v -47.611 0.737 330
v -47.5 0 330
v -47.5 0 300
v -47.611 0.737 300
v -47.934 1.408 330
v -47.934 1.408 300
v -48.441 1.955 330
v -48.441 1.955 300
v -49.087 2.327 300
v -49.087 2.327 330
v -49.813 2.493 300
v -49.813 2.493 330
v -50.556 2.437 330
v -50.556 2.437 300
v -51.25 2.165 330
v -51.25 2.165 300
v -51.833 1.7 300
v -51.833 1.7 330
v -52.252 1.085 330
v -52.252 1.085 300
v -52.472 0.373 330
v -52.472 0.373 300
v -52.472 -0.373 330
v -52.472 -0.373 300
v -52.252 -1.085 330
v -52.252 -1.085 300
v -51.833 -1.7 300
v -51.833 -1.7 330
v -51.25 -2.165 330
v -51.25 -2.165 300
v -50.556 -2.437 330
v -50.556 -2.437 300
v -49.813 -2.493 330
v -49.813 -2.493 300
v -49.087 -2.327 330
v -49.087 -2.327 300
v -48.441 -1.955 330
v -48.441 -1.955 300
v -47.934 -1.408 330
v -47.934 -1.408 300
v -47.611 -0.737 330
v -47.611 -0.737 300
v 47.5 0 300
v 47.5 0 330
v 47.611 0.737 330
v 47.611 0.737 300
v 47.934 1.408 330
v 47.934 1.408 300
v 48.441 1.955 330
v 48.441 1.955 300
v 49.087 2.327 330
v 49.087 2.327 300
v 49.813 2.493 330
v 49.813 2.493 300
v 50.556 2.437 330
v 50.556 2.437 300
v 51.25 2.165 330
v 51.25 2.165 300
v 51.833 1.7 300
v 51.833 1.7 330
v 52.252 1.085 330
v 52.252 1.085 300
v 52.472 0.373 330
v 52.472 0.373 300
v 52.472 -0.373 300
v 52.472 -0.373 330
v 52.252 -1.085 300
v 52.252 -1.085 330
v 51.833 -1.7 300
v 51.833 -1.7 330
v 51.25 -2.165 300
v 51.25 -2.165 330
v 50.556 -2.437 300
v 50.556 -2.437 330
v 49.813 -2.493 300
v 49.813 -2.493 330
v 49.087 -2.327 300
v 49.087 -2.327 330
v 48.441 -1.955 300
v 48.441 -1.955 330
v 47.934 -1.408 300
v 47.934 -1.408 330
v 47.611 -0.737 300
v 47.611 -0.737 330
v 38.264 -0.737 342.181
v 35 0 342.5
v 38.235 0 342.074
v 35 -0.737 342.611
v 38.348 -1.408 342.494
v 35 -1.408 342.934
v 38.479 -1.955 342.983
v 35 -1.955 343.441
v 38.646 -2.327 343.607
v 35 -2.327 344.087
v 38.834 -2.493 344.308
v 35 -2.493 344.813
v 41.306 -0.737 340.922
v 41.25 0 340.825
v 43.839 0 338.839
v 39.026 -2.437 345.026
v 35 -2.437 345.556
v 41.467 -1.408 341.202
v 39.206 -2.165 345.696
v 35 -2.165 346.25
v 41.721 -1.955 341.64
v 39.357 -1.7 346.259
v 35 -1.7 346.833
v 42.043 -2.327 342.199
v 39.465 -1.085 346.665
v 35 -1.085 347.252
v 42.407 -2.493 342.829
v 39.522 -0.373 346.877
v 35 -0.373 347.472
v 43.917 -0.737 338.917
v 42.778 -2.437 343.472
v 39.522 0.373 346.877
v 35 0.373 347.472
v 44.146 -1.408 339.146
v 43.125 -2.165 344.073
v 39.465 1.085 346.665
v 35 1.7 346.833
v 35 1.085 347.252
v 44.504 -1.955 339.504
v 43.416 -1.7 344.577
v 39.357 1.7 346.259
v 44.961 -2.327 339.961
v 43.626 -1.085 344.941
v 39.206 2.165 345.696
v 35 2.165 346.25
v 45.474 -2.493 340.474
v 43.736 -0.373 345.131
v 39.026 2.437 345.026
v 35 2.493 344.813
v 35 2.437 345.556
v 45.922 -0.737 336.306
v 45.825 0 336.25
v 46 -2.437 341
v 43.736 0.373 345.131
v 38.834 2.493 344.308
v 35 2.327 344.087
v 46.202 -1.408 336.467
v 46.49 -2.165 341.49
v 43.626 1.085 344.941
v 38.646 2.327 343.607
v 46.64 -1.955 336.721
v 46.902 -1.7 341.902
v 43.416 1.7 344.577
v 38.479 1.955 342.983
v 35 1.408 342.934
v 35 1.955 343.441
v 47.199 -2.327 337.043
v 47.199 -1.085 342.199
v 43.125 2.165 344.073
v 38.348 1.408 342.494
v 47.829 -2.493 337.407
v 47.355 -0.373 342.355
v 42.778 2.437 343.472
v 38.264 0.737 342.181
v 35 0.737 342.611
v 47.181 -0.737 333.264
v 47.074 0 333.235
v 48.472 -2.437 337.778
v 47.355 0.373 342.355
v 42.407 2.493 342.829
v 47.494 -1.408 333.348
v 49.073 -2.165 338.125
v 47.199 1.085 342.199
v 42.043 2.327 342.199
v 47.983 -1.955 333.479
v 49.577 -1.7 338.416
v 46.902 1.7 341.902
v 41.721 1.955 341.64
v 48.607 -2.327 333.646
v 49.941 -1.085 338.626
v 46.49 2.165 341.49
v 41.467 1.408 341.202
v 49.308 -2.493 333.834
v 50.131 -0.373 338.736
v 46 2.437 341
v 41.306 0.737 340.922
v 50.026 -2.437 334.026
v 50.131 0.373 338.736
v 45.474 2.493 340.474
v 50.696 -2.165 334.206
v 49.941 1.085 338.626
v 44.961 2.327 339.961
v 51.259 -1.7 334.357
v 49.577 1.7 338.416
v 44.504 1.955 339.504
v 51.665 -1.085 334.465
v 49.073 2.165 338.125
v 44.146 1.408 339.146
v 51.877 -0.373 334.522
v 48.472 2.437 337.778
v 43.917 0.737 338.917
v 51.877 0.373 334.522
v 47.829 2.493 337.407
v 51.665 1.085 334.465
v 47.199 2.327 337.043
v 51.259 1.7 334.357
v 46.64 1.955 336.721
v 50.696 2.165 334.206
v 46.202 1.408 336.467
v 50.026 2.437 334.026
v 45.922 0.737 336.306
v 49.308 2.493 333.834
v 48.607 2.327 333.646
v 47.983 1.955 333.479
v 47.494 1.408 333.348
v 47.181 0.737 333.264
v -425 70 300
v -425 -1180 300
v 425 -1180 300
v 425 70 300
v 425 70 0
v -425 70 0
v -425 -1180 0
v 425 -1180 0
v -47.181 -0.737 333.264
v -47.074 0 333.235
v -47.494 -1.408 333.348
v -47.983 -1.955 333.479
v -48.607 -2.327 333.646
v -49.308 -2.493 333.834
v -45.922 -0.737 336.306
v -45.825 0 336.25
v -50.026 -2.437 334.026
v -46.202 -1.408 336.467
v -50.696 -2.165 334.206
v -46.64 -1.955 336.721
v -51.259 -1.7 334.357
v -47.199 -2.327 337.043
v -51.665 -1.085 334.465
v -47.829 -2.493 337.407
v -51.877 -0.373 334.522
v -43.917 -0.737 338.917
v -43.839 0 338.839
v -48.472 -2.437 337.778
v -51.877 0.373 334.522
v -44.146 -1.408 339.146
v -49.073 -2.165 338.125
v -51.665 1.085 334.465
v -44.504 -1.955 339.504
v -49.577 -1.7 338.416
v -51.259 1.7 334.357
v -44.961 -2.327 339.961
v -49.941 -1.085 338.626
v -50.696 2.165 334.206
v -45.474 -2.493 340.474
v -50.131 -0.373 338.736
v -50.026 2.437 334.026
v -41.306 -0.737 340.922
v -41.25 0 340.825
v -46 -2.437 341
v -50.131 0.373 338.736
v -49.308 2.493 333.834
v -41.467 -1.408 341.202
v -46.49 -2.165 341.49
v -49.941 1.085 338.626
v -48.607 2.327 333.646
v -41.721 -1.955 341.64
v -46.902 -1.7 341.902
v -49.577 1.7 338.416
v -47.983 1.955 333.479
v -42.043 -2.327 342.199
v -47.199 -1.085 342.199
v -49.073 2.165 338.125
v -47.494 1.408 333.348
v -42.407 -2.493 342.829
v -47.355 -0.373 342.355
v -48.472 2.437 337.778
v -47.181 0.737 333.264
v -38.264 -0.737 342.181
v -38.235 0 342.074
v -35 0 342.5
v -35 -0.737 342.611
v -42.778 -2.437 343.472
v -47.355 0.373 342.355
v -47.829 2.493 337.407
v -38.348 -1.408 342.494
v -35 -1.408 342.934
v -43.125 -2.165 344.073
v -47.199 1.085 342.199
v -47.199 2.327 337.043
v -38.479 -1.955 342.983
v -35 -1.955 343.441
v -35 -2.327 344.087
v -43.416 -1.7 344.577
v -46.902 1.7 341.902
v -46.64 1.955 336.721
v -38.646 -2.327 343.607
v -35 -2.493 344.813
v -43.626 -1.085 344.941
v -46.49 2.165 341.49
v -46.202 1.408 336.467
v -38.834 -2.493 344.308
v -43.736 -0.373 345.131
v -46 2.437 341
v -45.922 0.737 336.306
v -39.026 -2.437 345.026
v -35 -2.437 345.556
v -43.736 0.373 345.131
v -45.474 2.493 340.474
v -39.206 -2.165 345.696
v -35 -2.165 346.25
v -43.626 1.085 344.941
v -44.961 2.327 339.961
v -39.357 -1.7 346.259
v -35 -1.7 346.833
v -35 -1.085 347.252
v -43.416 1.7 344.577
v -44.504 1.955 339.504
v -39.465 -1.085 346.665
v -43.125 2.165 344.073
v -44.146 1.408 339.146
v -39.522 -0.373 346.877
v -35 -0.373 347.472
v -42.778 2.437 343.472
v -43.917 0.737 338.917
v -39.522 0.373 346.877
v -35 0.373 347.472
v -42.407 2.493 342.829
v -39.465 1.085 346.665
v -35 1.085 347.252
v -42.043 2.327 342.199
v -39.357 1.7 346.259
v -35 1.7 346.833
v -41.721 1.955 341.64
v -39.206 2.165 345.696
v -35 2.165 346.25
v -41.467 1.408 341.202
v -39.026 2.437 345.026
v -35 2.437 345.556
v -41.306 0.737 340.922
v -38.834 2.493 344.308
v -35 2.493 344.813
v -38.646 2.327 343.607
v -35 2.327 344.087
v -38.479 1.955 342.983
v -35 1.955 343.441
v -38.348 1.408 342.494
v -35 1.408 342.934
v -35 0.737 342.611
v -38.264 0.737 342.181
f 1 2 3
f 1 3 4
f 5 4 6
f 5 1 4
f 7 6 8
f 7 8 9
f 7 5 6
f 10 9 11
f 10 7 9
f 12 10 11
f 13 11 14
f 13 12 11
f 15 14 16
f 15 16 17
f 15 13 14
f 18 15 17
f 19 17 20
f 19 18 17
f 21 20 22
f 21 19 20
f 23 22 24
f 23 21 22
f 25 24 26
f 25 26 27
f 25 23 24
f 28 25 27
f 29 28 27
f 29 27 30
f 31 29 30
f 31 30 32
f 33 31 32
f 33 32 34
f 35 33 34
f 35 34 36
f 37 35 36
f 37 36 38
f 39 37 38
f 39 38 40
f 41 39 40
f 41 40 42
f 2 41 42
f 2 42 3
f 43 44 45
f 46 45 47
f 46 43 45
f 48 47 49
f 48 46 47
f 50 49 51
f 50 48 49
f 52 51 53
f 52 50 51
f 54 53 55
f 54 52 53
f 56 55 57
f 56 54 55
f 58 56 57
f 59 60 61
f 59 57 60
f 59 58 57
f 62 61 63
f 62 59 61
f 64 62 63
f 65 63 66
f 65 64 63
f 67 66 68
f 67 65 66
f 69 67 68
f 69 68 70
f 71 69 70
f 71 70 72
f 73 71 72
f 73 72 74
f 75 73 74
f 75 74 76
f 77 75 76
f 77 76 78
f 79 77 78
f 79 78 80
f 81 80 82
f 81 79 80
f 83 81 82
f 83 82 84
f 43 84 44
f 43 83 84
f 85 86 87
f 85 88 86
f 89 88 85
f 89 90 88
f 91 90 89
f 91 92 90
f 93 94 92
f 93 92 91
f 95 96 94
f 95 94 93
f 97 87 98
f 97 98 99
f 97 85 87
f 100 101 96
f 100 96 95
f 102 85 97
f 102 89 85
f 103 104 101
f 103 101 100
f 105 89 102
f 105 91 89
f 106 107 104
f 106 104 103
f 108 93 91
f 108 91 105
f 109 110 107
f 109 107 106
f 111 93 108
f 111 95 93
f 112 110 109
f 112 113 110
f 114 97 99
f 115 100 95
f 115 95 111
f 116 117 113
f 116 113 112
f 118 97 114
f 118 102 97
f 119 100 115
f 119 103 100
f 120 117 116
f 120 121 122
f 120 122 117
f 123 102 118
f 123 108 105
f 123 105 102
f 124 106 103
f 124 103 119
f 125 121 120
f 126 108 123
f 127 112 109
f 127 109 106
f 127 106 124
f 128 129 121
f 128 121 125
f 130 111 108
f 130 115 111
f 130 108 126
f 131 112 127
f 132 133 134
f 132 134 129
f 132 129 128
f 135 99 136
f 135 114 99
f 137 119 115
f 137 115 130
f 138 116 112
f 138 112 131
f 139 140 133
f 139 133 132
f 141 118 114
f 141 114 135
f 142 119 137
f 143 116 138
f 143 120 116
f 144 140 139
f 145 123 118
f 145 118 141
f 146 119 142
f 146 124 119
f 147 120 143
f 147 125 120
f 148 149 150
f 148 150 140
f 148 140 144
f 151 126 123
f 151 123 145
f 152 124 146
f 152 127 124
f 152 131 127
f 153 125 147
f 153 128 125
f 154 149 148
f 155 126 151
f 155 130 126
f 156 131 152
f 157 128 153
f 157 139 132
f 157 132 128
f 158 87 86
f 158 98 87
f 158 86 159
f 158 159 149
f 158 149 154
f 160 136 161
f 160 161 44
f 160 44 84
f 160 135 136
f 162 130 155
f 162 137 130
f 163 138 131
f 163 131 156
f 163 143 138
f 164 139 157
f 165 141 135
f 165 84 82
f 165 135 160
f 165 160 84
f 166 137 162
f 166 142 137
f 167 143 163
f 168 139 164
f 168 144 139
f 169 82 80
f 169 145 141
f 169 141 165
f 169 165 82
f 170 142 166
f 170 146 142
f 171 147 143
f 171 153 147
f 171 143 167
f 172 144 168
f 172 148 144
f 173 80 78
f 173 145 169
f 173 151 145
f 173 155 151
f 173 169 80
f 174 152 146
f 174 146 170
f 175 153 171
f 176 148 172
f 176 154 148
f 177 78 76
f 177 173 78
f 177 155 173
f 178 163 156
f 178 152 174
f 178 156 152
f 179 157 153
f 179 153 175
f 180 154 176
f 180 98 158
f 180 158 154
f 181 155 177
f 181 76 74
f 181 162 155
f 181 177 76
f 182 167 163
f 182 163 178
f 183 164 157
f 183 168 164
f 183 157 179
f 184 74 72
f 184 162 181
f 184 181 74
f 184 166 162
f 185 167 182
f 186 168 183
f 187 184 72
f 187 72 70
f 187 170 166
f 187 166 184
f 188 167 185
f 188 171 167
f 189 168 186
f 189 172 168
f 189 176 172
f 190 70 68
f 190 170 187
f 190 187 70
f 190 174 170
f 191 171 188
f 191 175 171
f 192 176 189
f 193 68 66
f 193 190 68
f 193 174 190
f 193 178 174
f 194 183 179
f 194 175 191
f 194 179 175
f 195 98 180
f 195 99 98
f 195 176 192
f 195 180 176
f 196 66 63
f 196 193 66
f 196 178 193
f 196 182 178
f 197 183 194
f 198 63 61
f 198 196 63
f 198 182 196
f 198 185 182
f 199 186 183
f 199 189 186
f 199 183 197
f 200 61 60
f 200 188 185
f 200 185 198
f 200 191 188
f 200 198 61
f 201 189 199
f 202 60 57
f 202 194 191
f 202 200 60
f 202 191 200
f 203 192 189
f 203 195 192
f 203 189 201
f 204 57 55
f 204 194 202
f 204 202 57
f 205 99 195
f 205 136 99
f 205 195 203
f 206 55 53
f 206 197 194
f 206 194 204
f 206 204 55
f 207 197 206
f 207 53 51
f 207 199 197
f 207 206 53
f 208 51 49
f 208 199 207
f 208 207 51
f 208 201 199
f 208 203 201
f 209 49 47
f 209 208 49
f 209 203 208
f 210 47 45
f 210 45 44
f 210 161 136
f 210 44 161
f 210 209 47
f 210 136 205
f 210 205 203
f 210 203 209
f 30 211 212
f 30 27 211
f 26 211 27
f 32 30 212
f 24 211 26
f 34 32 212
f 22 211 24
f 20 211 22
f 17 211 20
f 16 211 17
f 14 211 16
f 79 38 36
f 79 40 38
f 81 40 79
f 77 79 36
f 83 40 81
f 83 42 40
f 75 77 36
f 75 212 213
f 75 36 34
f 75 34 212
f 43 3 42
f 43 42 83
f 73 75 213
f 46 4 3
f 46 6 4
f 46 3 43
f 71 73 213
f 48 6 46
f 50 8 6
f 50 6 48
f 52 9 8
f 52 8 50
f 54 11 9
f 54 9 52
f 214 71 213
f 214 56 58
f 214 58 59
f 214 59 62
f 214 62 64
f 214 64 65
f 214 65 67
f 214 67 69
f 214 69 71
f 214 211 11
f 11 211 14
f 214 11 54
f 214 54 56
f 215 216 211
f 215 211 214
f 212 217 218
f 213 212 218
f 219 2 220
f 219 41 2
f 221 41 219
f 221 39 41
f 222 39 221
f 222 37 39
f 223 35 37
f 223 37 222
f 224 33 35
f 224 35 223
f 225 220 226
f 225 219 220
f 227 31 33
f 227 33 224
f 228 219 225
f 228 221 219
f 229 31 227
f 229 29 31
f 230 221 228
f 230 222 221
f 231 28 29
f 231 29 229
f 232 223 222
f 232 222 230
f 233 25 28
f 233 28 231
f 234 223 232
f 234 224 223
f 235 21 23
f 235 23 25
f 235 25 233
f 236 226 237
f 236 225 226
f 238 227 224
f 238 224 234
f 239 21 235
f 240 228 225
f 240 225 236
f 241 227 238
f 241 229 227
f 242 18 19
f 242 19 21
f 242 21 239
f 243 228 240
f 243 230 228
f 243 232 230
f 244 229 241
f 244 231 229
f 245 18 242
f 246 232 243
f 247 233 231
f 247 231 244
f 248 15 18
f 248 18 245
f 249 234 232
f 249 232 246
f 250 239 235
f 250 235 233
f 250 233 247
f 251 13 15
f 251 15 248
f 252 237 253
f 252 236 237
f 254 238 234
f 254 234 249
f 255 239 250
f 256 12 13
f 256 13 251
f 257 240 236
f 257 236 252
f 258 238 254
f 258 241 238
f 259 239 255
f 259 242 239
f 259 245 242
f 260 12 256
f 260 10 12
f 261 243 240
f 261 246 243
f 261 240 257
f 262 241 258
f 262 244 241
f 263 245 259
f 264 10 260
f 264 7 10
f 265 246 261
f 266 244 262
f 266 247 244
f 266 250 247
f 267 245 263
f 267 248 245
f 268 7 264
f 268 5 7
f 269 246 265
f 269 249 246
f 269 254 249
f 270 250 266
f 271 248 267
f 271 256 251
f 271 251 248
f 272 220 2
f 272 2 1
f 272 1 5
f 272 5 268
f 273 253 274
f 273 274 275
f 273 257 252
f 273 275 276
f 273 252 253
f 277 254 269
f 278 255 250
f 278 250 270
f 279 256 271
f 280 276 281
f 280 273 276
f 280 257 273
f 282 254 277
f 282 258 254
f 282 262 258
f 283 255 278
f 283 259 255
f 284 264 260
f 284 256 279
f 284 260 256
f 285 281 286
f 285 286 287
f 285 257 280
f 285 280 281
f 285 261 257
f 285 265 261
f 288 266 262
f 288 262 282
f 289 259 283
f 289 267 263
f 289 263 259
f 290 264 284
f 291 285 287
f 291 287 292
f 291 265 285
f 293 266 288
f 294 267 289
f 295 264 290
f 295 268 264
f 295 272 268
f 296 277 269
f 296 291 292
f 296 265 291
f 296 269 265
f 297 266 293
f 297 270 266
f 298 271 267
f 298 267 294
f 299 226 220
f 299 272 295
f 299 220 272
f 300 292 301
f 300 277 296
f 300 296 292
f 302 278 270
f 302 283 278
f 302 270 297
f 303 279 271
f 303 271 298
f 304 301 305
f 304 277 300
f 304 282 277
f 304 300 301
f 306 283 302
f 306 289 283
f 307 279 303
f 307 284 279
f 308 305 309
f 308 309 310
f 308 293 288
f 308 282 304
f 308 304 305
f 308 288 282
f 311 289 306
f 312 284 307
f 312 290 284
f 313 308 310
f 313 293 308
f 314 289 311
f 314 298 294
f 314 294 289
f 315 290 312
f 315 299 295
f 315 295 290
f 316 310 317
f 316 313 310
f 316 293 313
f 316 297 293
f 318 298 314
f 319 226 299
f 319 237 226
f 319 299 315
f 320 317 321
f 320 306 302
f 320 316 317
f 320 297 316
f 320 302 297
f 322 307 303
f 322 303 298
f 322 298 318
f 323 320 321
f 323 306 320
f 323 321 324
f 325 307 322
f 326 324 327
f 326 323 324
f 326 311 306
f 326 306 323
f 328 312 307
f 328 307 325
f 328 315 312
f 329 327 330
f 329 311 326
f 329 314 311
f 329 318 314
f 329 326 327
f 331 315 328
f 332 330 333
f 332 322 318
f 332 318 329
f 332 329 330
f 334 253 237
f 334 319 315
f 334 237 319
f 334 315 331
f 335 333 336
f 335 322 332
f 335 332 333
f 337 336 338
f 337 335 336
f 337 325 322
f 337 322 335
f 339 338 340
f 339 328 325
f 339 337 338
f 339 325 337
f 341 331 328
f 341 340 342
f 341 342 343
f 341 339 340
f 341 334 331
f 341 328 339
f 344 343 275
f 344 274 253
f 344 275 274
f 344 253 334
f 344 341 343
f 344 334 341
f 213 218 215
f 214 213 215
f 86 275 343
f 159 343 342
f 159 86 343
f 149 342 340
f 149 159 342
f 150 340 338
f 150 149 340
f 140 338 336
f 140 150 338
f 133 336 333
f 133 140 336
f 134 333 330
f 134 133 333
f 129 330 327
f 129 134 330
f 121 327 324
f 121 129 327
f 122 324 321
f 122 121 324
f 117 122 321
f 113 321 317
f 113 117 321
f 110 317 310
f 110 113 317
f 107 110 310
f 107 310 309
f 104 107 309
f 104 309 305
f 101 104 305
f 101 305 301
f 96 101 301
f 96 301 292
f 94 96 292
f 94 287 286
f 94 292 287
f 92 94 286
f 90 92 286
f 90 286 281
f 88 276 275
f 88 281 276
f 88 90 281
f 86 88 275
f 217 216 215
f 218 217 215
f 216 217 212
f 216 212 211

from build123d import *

# Parameters (mm, degrees)
CROQUIS1_W              = 850
CROQUIS1_H              = 1250
SALIENTE_EXTRUIR1_DEPTH = 300
CROQUIS3_R              = 2.5


with BuildPart() as part:
    # Croquis1 → Saliente-Extruir1 (new body)
    with BuildSketch(Plane.XY):
        with Locations((0, -555)):
            Rectangle(CROQUIS1_W, CROQUIS1_H)
    extrude(amount=SALIENTE_EXTRUIR1_DEPTH)

    # Barrer1: sweep along a path in Croquis2
    with BuildLine(Plane(origin=(0, 0, 0), x_dir=(1, 0, 0), z_dir=(0, 1, 0))) as barrer1_path:
        Line((-50, -300), (-50, -330))
        ThreePointArc((-50, -330), (-45.606601718, -340.606601718), (-35, -345))
        Line((-35, -345), (35, -345))
        ThreePointArc((35, -345), (45.606601718, -340.606601718), (50, -330))
        Line((50, -330), (50, -300))
    # Croquis3 → Barrer1 (sweep)
    with BuildSketch(Plane.XY.offset(300)):
        with Locations((-50, 0)):
            Circle(CROQUIS3_R)
    sweep(path=barrer1_path.line)


solid = part.part
